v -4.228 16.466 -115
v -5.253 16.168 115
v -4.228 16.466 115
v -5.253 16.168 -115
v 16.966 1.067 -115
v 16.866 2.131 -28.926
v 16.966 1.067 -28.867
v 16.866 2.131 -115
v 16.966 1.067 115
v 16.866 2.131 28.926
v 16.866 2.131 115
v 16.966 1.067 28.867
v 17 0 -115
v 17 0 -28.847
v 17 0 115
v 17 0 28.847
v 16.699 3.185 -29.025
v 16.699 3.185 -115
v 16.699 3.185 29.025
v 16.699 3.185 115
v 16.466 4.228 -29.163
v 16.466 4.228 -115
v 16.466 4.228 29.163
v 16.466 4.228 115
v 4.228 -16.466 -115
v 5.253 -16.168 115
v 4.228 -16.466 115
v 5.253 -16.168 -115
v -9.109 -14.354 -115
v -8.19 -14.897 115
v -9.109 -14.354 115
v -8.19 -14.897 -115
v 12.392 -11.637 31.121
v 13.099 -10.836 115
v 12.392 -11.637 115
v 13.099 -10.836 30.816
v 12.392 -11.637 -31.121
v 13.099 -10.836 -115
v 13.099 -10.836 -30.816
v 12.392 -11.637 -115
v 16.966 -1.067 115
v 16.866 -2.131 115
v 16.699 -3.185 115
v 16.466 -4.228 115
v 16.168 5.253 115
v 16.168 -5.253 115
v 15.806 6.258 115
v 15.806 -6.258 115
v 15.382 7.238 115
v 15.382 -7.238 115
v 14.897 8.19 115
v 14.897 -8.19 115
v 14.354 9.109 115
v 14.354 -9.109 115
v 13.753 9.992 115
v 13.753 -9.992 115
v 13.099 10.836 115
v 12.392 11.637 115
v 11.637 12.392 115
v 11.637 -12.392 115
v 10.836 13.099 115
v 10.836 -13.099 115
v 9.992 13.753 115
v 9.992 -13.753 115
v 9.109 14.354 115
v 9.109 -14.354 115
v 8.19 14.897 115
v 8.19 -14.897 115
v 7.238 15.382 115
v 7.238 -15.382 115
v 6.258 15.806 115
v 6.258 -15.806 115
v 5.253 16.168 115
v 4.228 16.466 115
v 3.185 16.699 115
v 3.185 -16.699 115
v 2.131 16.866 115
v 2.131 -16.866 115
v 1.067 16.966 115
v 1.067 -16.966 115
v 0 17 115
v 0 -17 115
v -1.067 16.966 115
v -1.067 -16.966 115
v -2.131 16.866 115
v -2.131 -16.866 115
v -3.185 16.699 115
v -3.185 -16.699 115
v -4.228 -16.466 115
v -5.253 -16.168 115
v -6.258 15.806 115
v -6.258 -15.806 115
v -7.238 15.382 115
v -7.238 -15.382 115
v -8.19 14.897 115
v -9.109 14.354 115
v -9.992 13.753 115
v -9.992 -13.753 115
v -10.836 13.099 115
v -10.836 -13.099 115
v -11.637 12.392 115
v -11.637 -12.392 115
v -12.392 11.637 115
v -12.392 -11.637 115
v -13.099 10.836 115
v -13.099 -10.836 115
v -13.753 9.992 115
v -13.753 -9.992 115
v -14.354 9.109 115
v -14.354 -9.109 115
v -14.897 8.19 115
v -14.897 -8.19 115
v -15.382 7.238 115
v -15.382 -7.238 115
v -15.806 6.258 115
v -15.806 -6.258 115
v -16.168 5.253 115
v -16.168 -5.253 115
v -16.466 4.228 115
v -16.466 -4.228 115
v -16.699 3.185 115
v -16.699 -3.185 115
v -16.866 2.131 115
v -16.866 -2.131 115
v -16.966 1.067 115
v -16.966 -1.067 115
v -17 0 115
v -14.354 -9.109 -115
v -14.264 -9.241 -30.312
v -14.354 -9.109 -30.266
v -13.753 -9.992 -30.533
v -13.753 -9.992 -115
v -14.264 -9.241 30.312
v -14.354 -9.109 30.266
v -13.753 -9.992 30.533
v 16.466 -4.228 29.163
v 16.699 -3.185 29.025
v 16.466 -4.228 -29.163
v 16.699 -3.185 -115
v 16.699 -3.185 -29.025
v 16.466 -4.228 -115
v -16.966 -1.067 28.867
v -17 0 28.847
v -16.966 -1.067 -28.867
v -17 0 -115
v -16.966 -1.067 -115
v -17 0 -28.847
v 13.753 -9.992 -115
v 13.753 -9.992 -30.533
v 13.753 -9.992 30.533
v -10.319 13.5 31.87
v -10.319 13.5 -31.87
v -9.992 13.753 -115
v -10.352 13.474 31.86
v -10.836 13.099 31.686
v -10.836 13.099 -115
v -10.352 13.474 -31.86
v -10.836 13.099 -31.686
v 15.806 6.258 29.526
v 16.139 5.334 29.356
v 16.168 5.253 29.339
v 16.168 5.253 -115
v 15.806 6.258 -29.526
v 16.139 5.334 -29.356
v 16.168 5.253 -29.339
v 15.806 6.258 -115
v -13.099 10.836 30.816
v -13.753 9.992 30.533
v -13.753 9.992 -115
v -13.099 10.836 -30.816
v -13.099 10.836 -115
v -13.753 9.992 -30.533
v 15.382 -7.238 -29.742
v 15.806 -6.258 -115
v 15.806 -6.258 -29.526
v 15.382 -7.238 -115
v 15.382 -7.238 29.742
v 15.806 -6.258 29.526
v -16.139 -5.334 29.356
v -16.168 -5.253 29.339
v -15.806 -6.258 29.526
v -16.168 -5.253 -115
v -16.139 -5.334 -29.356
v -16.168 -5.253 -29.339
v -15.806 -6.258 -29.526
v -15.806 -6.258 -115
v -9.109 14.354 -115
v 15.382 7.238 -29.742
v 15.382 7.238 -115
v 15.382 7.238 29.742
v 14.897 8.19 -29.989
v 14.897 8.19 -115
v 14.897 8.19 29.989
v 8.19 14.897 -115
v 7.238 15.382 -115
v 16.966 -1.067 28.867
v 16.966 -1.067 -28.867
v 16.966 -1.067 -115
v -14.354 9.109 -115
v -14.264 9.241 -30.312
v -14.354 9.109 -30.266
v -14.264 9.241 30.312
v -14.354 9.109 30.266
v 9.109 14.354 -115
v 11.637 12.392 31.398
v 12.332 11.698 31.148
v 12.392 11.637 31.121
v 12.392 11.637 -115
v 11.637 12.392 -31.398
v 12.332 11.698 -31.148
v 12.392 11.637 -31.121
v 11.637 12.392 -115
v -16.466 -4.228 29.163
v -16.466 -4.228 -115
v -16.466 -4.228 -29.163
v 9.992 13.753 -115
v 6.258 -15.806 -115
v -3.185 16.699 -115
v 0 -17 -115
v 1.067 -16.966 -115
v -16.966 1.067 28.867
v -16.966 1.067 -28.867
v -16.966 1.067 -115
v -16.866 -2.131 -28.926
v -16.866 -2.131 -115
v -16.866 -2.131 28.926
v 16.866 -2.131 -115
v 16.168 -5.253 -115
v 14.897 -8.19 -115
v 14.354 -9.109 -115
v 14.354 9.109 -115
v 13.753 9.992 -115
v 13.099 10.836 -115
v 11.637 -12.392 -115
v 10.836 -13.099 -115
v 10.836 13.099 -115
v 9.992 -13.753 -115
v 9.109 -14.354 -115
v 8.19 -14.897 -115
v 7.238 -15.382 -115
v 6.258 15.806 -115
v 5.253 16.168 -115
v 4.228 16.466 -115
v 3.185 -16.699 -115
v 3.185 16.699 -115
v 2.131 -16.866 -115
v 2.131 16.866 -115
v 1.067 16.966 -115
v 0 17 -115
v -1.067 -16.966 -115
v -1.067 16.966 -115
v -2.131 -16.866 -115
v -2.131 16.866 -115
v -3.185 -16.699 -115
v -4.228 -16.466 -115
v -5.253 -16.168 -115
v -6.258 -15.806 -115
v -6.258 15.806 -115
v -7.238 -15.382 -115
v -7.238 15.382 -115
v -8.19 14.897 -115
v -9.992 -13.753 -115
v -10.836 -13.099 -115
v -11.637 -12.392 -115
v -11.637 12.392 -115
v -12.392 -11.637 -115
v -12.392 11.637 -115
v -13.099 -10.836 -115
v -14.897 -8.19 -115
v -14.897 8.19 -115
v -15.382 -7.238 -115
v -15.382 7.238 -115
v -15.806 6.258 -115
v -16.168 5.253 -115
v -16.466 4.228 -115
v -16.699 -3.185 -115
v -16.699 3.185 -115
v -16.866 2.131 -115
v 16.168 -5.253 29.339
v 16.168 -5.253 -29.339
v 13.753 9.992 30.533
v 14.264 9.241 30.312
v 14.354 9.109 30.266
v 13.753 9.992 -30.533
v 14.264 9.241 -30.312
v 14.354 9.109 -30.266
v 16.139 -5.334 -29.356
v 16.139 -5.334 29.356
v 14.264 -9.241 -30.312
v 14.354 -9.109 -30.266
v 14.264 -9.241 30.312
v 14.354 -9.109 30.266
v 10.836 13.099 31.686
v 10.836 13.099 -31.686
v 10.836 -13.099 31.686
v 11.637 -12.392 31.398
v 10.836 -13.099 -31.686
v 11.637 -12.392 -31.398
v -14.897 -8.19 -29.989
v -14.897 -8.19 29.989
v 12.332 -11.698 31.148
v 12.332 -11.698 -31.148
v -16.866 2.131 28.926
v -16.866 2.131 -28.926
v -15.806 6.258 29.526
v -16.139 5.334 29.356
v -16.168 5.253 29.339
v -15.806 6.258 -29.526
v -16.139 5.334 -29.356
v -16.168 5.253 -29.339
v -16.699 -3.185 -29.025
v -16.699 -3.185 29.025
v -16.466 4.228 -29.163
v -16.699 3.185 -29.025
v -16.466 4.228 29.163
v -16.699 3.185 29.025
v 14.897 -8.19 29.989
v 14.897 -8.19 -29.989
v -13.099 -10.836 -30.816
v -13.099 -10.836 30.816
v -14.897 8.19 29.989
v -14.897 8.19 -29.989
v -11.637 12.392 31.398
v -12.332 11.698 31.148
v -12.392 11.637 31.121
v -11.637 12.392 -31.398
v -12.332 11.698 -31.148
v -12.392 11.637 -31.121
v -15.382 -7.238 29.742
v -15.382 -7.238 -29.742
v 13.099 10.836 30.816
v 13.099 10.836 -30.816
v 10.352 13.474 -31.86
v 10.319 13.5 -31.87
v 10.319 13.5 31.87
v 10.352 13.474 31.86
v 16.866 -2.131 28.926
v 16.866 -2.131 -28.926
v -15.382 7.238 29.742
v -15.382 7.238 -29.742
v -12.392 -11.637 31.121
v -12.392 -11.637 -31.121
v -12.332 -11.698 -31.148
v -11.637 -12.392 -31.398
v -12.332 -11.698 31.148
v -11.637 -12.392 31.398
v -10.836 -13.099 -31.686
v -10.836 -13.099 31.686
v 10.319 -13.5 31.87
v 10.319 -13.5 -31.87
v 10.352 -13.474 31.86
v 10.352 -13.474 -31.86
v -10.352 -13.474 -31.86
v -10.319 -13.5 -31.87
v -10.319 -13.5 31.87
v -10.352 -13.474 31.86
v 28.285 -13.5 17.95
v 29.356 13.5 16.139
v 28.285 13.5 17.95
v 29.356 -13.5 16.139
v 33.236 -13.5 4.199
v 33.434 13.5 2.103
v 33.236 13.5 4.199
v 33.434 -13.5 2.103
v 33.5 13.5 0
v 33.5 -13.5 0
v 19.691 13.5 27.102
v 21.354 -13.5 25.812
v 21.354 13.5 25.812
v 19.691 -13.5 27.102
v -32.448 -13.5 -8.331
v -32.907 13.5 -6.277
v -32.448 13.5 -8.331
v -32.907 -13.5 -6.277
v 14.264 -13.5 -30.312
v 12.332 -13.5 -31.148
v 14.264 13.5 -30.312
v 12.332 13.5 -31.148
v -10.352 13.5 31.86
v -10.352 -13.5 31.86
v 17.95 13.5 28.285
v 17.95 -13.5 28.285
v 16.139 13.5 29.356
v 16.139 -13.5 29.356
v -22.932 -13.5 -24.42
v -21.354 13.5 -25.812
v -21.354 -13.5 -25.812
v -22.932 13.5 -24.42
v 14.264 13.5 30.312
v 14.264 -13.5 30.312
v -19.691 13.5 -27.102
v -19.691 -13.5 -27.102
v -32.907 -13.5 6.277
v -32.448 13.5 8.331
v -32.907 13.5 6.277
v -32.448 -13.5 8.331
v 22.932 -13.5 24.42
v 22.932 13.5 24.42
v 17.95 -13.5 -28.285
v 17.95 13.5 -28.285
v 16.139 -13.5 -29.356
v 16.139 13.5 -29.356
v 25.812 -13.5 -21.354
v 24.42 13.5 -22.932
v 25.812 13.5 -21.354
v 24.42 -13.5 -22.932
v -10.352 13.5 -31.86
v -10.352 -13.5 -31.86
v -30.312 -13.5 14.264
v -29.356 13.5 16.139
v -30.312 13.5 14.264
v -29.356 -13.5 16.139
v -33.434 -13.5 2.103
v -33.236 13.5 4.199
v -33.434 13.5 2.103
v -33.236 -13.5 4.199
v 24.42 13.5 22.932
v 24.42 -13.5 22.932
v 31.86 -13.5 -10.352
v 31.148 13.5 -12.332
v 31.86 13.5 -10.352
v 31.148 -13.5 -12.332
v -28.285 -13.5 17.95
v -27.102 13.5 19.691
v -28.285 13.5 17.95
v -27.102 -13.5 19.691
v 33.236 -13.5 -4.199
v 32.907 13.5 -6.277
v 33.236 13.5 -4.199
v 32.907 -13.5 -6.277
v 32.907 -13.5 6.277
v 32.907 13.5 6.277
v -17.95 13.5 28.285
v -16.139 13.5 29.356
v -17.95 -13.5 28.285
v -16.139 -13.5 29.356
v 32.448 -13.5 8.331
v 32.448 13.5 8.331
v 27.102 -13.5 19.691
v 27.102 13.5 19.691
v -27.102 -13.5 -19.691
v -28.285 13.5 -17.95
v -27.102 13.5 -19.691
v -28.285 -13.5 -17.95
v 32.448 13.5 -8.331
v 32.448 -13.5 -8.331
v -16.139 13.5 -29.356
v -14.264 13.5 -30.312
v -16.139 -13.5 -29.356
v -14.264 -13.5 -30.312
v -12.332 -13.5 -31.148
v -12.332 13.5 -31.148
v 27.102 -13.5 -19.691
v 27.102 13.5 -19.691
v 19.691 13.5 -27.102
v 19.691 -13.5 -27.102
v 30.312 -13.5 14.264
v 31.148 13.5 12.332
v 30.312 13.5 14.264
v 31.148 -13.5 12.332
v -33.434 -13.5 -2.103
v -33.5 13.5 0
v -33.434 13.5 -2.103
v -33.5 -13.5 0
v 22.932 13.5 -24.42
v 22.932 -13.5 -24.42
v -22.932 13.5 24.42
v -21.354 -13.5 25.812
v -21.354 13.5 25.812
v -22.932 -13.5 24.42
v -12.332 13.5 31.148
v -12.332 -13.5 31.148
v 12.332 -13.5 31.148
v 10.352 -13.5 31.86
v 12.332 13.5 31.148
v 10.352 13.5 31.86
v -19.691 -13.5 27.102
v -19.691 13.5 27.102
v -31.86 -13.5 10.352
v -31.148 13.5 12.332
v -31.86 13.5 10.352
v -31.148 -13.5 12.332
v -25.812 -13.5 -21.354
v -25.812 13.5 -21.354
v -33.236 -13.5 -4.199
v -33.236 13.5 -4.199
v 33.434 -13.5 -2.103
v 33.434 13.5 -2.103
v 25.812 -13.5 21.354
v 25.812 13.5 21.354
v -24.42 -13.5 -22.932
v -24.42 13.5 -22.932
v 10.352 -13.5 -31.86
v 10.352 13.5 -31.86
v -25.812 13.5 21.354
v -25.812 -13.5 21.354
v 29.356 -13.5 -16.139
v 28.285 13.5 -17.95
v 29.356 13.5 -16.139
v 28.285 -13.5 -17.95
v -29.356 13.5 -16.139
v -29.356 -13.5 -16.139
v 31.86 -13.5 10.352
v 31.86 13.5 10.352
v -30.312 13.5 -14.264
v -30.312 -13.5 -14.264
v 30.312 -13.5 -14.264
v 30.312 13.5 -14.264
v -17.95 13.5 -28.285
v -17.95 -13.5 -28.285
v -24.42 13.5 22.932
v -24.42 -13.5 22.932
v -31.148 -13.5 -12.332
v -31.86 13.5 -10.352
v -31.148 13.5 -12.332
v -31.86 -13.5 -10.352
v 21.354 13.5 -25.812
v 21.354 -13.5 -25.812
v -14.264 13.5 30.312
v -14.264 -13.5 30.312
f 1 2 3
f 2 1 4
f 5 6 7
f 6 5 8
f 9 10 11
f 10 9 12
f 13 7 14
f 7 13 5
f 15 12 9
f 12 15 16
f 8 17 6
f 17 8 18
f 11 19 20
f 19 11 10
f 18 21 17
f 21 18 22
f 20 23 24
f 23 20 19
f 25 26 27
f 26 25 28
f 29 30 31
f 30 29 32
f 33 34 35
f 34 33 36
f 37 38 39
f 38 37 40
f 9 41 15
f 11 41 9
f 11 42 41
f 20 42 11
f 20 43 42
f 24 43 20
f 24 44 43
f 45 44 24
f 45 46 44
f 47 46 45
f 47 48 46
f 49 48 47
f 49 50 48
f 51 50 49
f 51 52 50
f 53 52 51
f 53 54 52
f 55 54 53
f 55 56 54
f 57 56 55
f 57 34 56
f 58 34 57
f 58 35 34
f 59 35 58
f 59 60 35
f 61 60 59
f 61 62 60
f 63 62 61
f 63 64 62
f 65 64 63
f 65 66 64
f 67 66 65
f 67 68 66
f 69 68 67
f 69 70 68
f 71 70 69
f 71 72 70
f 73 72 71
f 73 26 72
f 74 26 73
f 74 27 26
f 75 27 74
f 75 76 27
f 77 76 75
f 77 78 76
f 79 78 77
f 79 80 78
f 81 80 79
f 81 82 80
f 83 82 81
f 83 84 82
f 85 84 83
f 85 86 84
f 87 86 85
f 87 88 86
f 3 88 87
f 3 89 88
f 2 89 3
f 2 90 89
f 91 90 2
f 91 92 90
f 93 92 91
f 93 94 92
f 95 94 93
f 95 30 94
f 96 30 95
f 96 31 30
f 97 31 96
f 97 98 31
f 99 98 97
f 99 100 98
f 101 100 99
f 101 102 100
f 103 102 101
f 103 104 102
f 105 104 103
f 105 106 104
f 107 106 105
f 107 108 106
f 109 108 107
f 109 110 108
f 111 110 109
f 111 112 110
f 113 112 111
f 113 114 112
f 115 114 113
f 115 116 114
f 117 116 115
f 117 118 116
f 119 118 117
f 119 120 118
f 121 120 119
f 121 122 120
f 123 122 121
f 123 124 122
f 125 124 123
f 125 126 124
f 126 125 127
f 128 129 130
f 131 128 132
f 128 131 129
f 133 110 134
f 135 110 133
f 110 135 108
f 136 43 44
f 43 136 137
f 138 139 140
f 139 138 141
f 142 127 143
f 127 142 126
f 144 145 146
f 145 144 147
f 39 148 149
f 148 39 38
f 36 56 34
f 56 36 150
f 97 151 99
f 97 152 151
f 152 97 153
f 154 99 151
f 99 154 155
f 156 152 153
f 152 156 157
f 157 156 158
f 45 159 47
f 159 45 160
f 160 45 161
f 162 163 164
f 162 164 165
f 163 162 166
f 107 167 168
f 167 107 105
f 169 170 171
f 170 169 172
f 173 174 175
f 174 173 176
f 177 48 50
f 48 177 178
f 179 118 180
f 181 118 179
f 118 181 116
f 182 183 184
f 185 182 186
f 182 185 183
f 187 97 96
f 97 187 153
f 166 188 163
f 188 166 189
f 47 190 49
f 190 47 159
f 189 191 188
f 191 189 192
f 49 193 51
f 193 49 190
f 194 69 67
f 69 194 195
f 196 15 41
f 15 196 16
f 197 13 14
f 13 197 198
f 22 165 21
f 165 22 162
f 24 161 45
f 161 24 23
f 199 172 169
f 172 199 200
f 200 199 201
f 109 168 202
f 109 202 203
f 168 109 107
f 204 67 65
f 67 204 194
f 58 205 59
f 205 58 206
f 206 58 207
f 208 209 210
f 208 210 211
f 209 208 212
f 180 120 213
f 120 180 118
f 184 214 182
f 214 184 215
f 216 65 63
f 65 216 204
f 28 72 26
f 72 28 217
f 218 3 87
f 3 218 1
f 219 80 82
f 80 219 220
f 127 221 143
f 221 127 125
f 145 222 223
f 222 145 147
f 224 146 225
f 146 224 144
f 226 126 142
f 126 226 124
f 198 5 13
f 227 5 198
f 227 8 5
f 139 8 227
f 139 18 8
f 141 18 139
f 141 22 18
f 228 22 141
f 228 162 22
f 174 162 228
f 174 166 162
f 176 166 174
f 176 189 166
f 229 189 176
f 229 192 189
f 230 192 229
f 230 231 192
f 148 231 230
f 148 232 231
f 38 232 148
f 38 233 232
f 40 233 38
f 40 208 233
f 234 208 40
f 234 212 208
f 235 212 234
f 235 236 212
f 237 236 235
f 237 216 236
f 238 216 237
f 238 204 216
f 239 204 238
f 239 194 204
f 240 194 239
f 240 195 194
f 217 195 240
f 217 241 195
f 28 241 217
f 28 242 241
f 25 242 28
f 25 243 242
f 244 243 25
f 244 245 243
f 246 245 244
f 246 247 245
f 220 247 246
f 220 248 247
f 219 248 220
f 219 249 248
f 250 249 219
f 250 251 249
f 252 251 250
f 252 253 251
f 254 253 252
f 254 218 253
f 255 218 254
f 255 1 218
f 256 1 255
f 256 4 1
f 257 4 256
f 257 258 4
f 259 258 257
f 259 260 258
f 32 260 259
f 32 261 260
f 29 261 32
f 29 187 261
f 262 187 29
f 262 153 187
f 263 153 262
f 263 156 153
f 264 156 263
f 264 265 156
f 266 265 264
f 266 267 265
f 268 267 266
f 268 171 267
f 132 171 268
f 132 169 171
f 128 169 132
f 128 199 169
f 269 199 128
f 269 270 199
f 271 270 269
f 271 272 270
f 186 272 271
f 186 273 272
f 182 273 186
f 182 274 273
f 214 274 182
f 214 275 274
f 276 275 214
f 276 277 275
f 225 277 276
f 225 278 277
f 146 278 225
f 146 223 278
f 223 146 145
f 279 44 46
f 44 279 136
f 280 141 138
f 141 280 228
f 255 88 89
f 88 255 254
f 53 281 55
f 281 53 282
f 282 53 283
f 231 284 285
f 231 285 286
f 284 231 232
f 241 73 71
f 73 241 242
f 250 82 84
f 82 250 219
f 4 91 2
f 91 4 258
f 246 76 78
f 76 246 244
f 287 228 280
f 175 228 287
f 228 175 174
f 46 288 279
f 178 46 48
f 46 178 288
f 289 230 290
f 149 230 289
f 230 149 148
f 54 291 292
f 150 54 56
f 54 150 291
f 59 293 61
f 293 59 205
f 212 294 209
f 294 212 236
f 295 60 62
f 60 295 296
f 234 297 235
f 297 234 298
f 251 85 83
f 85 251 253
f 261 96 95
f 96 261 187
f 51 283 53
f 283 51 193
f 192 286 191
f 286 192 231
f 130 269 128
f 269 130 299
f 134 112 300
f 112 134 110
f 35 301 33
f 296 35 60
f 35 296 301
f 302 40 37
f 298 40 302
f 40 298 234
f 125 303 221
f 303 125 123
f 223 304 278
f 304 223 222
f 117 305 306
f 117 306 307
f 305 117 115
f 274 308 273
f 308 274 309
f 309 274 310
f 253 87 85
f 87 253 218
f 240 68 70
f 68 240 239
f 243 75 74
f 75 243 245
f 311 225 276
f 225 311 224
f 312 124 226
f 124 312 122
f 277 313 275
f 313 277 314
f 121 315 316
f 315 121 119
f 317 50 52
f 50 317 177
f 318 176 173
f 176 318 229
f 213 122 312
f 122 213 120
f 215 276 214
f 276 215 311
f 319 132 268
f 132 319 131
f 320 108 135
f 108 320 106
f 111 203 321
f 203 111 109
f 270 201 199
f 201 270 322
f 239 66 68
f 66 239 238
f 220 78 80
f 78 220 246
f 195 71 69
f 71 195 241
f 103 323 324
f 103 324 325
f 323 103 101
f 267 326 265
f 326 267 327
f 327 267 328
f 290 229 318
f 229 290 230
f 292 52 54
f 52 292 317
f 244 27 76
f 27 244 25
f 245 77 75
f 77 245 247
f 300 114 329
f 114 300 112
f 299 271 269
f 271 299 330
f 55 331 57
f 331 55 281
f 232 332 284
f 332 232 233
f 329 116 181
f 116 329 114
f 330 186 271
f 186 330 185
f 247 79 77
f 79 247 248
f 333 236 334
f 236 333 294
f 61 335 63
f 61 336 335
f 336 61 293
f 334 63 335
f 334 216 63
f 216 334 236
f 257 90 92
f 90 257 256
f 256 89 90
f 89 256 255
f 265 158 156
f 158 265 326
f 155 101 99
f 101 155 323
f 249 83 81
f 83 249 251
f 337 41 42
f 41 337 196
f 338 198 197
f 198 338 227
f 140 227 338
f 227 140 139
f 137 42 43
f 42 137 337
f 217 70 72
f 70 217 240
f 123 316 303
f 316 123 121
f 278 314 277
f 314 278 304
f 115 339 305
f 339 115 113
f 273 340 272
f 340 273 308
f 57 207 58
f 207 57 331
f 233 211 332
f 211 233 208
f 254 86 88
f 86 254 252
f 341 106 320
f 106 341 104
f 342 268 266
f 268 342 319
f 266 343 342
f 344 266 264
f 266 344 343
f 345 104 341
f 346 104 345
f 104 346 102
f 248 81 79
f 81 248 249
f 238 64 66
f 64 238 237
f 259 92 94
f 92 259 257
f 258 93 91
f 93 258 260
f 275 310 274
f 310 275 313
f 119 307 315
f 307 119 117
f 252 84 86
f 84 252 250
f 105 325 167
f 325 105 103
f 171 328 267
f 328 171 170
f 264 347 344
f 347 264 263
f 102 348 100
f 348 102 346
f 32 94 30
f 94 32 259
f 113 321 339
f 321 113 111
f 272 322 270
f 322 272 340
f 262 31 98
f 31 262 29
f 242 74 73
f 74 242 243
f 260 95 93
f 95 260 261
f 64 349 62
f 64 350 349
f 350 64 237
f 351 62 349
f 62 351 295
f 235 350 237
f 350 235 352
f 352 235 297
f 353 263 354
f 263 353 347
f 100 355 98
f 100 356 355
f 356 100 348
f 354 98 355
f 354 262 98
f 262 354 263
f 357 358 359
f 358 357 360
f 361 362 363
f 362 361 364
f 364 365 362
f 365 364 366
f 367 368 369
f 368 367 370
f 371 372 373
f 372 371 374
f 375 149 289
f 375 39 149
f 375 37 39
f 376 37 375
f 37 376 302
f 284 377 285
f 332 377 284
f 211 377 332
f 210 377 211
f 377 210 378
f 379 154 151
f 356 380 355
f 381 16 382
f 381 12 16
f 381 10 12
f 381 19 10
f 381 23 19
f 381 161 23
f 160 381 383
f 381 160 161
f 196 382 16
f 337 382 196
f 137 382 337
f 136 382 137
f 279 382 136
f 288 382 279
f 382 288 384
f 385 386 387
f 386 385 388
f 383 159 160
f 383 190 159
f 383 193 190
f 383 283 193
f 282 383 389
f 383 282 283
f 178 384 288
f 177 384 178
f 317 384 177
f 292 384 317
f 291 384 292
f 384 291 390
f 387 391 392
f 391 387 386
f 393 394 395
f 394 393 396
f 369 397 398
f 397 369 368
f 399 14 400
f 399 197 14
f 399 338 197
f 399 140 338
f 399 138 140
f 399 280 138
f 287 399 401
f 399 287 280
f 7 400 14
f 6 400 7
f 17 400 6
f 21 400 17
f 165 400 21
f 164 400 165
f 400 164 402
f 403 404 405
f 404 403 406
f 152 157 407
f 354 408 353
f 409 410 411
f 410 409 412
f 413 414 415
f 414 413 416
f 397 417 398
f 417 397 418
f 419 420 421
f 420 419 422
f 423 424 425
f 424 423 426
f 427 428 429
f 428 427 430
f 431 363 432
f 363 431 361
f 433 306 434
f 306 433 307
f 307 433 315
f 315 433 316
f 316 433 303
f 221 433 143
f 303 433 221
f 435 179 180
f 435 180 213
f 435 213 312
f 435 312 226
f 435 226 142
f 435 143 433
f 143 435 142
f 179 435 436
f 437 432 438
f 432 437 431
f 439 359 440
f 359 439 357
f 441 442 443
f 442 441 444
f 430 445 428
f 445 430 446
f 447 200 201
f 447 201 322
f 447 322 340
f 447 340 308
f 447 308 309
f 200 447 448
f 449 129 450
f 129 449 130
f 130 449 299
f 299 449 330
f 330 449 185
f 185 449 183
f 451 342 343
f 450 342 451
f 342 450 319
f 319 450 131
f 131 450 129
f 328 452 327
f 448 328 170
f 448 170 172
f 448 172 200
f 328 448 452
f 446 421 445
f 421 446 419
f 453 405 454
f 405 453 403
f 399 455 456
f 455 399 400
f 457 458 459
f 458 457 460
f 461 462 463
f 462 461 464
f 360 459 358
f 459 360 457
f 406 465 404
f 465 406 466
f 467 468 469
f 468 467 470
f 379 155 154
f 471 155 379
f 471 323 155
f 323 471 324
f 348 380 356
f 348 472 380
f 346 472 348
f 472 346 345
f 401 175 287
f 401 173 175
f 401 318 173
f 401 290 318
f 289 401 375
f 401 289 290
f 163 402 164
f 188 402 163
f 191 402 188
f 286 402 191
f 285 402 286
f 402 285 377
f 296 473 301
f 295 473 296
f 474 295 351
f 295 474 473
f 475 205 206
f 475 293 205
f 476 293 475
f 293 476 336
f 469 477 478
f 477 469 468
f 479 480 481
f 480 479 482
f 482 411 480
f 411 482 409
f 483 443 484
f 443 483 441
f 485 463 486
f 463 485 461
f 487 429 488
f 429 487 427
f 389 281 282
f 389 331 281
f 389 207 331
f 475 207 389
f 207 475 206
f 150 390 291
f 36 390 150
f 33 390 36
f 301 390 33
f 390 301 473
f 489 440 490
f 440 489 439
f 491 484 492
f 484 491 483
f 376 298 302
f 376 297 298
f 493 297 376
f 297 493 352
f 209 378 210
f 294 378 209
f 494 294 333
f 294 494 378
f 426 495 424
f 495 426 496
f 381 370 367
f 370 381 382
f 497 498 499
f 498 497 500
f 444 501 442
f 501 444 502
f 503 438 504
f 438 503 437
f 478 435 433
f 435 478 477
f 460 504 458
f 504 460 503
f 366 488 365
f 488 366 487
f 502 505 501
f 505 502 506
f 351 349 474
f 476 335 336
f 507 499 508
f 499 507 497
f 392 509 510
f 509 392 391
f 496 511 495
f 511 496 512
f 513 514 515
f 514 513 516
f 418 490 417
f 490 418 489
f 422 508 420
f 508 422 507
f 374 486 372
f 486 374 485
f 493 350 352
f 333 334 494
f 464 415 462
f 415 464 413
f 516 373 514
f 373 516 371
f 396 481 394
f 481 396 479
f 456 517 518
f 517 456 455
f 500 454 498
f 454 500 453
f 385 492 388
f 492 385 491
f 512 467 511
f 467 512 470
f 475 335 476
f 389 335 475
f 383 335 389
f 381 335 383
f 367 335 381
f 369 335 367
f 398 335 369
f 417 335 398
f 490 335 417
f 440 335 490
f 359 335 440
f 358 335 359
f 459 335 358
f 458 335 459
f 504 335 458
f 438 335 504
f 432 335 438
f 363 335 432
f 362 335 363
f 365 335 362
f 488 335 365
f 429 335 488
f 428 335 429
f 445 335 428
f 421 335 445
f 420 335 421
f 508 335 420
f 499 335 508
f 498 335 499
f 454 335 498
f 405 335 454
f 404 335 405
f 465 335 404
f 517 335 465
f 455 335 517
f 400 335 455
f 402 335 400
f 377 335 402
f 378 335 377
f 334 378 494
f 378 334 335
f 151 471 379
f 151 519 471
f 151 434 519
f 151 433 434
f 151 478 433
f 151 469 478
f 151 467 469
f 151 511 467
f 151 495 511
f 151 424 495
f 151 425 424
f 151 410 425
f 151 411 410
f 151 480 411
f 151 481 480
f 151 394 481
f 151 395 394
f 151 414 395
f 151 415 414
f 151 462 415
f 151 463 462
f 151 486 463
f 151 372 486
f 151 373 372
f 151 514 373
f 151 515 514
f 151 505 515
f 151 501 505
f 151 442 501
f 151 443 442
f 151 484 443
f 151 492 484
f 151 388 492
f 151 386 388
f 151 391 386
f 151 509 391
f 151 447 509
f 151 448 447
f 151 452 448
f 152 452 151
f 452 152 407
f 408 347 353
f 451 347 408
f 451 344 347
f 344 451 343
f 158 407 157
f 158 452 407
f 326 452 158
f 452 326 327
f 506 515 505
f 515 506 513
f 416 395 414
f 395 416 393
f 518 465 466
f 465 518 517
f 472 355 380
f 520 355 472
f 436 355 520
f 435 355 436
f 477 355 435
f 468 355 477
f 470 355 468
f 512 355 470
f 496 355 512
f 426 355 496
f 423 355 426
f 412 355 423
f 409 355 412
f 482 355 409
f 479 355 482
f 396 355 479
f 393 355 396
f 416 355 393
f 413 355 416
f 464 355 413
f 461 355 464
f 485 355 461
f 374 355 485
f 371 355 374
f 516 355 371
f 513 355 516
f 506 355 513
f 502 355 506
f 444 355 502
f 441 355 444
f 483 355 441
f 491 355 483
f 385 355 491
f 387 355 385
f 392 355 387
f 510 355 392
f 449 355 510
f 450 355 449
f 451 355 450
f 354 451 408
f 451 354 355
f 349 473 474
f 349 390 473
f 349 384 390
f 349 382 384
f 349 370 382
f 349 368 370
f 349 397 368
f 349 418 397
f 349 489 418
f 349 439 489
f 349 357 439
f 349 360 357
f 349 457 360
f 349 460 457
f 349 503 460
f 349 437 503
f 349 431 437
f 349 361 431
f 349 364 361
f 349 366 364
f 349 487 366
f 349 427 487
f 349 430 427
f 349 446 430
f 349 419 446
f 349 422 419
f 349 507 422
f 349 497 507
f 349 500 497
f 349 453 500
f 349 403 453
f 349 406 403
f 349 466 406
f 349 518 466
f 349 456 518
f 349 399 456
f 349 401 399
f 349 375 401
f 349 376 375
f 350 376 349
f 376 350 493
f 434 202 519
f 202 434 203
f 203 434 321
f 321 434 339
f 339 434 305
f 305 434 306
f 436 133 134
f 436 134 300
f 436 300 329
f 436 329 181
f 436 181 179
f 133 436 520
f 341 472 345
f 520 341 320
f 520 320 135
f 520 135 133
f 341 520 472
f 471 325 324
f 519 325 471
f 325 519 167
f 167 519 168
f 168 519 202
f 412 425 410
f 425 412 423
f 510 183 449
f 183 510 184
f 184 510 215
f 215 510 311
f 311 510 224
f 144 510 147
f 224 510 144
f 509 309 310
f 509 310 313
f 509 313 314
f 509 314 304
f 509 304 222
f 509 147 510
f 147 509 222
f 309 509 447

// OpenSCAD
$fn = 100;
union()
{
  cylinder(h = 230, r = 17, center = true);
  rotate(a = 90, v = [1, 0, 0])
  {
    cylinder(h = 27, r = 33.5, center = true);
  }
  rotate(a = 90, v = [1, 0, 0])
  {
    cylinder(h = 27, r = 33.5, center = true);
  }
}
